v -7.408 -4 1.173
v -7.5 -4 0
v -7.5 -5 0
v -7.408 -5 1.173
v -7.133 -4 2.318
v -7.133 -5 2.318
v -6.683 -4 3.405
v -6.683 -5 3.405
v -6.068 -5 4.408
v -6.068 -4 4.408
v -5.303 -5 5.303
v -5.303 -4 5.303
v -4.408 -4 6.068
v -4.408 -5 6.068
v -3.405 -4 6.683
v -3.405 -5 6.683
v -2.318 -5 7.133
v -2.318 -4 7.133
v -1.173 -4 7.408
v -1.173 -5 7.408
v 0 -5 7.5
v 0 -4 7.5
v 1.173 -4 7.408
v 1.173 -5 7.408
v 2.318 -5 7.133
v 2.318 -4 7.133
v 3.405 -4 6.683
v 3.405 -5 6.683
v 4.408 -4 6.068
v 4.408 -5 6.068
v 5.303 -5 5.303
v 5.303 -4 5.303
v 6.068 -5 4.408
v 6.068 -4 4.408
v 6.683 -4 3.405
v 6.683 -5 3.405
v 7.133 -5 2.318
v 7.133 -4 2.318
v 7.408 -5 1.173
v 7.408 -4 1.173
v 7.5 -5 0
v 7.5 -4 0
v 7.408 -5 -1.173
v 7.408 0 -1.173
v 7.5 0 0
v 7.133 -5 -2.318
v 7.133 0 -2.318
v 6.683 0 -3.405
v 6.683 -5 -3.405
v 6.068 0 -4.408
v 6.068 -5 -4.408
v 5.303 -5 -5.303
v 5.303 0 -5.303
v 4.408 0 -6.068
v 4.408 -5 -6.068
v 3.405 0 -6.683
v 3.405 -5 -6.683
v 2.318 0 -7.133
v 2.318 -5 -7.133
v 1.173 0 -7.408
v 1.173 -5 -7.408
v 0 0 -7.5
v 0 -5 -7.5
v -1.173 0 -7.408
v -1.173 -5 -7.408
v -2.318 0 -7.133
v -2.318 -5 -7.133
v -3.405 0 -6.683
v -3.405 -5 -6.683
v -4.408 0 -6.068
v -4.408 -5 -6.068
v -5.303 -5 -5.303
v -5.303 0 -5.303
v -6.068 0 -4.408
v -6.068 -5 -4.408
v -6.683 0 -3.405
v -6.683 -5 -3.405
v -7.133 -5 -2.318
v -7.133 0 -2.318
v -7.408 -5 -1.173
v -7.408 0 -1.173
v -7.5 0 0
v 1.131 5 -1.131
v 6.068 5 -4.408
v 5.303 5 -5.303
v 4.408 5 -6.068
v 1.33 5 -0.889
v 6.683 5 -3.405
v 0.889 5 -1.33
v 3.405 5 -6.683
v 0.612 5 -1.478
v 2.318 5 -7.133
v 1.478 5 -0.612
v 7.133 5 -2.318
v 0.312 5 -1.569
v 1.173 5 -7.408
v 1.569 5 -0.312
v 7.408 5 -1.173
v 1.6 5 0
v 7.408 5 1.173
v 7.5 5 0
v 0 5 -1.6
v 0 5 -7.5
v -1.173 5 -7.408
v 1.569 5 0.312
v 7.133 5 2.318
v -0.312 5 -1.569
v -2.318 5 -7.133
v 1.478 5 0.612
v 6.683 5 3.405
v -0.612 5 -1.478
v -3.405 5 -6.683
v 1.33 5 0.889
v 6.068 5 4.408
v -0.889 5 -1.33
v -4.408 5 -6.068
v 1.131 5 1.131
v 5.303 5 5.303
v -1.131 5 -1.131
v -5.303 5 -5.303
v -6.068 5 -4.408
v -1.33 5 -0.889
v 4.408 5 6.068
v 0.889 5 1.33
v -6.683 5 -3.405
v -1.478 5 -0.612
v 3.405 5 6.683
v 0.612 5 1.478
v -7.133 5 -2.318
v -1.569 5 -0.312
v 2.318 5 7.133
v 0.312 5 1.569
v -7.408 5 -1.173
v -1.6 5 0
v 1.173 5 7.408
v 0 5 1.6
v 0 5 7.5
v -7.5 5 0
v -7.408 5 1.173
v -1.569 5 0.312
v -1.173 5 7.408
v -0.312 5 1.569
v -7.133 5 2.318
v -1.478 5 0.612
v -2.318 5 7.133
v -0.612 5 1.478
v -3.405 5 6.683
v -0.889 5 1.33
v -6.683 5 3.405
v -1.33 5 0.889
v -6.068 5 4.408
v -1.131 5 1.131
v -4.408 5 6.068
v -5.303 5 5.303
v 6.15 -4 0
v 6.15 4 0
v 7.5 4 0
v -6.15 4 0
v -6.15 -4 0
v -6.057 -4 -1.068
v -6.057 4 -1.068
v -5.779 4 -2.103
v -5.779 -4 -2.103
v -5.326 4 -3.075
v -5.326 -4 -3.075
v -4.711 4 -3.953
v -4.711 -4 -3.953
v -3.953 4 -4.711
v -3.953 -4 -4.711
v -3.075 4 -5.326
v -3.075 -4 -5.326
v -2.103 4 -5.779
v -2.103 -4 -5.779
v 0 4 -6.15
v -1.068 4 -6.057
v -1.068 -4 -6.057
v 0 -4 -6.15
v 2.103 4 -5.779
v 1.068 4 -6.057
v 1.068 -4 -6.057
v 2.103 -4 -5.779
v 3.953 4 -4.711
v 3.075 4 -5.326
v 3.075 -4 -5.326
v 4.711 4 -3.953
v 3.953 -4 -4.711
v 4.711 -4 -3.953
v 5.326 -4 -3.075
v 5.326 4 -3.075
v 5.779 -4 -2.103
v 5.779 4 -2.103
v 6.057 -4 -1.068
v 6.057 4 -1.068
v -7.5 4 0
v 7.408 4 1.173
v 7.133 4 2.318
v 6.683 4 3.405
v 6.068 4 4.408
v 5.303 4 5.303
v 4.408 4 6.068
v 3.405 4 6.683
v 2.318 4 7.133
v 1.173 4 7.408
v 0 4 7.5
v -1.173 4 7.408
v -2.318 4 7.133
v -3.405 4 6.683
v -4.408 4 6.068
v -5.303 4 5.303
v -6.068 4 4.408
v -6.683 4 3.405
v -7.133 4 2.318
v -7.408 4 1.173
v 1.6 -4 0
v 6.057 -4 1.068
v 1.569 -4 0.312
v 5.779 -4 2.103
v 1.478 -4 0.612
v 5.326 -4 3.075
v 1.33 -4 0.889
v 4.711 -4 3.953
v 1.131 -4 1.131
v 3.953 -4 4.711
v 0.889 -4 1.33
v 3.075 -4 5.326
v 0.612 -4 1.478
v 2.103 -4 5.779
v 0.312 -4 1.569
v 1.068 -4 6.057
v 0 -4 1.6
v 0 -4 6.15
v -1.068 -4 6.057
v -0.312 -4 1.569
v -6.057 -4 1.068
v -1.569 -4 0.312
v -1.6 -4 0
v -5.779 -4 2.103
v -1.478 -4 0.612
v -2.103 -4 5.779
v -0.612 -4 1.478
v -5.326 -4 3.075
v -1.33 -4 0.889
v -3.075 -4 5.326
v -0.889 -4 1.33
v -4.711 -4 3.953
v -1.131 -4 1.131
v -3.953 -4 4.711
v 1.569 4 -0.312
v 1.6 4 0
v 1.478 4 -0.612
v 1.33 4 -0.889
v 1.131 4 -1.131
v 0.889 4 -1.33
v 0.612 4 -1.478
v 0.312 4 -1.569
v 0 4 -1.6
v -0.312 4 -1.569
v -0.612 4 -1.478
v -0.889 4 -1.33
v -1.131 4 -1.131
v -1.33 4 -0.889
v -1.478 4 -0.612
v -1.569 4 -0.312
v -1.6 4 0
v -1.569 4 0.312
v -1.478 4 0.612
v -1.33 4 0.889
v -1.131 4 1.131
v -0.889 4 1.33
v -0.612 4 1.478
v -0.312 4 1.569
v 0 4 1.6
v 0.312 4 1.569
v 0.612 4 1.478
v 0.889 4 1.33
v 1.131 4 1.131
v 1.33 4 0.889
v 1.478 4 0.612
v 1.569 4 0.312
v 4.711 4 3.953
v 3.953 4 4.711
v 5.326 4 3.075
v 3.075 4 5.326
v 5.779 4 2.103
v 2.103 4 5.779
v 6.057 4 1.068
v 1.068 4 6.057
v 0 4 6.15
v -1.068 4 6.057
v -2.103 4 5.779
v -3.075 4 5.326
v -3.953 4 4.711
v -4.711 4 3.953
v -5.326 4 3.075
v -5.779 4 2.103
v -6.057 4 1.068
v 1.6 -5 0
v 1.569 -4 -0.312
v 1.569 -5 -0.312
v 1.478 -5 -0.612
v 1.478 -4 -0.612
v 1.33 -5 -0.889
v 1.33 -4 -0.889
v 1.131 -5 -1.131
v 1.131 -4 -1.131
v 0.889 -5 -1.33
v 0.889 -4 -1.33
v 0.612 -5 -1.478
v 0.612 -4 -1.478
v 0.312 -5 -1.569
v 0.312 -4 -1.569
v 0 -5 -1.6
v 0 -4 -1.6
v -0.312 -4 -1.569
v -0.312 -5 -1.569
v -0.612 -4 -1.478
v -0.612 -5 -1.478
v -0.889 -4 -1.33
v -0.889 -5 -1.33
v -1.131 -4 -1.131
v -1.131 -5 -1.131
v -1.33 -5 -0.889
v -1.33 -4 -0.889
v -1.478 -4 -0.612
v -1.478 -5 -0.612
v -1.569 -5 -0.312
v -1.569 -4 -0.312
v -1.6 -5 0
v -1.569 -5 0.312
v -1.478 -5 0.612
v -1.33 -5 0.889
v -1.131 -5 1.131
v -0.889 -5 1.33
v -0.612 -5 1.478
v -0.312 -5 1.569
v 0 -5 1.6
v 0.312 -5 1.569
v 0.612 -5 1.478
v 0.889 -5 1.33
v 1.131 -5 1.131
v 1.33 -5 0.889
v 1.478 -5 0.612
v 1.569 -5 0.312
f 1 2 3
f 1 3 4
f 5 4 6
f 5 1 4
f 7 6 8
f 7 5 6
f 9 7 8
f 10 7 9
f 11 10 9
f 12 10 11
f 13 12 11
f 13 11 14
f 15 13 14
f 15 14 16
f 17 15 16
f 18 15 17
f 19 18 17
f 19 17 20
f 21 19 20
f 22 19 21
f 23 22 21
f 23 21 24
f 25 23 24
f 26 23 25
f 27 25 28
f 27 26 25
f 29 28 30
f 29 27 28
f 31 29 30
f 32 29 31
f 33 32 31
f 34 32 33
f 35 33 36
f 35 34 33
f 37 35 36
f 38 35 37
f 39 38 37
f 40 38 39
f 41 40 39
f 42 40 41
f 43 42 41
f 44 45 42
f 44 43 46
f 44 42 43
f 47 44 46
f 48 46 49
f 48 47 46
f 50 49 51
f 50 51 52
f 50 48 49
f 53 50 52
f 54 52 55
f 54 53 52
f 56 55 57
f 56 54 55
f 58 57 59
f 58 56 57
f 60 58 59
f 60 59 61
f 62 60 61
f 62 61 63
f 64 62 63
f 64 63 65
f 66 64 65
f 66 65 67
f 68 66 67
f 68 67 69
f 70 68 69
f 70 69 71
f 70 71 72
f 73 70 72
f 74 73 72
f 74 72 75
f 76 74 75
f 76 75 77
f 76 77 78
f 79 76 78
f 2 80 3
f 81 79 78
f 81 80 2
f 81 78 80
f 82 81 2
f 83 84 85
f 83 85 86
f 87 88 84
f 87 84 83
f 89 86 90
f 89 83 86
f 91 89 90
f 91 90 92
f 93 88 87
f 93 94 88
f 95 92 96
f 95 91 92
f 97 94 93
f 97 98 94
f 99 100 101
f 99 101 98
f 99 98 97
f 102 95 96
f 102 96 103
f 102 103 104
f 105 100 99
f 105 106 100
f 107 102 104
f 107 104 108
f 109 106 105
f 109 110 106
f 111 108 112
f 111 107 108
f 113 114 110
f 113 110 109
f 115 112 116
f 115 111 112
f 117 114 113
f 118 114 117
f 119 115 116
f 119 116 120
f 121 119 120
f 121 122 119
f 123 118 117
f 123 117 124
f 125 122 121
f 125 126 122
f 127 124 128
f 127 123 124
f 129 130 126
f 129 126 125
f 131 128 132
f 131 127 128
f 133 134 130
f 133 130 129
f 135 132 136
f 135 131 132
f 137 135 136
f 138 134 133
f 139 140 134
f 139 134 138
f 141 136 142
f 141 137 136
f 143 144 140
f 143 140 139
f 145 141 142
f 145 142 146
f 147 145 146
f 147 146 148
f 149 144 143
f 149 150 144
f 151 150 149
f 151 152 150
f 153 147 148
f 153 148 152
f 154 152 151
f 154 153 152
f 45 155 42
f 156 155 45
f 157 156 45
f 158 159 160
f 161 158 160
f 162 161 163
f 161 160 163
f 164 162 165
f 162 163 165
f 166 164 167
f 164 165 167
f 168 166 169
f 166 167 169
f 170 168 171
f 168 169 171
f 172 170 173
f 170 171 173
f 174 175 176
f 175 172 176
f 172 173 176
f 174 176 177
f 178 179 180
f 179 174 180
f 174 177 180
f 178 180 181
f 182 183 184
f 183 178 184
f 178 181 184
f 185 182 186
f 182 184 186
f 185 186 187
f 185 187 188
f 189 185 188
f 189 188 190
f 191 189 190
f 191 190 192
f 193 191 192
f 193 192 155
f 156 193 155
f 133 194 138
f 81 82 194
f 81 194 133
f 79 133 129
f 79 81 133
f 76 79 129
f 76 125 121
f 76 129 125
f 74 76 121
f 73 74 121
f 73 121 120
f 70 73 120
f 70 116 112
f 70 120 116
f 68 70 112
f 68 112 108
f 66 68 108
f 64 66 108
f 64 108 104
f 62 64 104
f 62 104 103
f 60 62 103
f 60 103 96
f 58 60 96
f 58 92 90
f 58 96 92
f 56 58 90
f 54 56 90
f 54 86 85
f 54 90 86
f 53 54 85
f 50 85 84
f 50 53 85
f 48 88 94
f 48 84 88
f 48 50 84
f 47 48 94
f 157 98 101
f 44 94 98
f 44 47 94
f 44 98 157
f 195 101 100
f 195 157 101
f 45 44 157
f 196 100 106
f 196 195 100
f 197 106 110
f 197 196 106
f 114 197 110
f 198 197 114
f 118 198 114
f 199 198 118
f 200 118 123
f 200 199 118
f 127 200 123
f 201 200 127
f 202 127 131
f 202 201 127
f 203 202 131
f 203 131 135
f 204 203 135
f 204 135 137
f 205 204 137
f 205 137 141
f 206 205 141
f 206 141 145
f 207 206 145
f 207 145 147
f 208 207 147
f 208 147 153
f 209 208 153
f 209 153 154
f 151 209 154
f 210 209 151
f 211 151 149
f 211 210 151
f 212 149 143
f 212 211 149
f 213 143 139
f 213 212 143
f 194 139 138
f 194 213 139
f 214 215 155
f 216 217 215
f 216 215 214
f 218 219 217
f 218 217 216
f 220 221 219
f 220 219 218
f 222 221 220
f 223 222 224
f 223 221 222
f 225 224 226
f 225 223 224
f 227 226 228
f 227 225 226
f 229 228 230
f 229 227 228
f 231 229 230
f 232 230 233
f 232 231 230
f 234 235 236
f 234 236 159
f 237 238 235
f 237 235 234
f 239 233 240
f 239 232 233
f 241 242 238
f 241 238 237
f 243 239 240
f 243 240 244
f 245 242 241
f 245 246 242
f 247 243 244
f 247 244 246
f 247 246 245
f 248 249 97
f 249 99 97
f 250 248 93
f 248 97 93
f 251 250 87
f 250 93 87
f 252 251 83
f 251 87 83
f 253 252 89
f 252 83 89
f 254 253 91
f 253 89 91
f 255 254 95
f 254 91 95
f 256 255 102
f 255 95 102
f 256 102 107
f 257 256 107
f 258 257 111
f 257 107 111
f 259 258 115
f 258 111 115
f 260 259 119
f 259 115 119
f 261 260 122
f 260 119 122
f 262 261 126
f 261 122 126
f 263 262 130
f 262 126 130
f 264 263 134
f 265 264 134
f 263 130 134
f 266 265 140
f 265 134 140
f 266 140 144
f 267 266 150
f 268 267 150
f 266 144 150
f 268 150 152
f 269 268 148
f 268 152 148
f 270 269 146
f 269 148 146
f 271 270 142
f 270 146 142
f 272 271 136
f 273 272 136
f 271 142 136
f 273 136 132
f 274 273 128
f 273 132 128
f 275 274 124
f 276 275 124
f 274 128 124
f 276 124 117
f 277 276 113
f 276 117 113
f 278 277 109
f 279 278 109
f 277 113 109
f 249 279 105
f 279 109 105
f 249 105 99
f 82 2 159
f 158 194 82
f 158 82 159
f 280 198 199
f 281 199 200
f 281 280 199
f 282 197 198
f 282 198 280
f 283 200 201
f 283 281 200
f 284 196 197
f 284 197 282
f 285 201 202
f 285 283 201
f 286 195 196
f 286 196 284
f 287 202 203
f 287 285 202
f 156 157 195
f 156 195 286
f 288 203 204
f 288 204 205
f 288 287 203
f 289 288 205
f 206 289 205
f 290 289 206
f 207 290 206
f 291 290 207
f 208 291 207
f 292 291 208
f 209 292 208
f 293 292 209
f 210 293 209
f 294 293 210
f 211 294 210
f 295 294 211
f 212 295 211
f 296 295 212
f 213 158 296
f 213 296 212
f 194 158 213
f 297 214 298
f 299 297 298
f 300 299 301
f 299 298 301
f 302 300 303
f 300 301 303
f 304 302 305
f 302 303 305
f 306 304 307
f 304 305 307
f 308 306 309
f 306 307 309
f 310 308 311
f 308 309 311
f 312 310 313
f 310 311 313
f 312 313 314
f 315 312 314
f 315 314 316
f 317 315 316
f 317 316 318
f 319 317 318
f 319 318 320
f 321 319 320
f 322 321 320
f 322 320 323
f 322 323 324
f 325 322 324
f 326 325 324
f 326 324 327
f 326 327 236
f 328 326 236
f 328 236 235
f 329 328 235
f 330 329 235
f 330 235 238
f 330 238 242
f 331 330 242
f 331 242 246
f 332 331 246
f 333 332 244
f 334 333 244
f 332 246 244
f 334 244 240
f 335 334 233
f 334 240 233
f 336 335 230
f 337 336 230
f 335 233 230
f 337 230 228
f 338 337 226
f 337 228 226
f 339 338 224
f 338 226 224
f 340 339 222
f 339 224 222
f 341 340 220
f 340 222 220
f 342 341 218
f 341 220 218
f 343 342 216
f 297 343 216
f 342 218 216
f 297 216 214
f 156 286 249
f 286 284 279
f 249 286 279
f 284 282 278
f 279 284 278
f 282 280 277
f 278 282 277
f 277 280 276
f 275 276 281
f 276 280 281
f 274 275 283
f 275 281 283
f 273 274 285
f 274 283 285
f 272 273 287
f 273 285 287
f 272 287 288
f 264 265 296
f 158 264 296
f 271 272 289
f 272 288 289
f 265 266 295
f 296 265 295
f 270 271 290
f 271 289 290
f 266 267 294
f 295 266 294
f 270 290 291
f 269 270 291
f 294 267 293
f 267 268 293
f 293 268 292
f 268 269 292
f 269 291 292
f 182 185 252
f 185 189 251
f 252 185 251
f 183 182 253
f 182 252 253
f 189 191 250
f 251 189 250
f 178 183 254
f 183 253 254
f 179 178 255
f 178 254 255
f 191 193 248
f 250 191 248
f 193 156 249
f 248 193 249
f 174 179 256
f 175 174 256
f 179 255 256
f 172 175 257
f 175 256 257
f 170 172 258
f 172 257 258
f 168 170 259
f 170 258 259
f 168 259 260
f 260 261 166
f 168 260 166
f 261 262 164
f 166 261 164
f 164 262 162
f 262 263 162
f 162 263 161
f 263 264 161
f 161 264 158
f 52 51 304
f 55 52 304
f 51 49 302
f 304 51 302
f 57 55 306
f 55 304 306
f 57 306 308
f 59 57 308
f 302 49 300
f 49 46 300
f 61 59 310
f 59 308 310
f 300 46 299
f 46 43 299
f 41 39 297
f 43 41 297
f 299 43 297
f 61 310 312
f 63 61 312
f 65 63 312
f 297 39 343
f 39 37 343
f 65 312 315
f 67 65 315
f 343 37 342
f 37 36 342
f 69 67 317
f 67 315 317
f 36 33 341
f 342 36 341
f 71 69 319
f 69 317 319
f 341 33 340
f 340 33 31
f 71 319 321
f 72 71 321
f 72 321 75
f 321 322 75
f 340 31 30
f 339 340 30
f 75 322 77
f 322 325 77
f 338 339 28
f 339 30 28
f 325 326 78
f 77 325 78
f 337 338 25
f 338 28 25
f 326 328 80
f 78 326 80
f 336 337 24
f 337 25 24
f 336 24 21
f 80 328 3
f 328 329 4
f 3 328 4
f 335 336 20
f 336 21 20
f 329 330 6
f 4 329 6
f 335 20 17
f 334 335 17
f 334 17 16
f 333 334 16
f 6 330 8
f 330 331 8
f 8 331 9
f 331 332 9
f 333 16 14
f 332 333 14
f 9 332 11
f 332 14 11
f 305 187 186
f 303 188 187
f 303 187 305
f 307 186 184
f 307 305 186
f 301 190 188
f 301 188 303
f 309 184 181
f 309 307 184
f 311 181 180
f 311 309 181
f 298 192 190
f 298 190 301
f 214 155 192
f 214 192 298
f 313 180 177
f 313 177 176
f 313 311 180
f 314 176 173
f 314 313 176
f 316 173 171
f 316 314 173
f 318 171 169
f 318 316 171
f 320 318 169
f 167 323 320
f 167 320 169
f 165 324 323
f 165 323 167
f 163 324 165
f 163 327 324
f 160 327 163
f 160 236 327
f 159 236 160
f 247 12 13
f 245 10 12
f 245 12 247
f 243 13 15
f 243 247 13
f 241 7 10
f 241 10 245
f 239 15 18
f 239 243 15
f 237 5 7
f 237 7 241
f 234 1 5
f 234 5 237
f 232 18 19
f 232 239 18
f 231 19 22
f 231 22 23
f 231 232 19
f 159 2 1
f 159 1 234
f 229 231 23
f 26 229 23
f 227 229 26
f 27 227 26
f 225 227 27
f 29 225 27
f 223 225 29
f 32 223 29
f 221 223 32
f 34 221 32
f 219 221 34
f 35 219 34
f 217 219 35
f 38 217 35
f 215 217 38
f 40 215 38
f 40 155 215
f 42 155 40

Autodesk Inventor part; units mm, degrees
ref_plane "YZ Plane" through (0, 0, 0) normal (1, 0, 0) x (0, 1, 0)
ref_plane "XZ Plane" through (0, 0, 0) normal (0, 1, 0) x (-1, 0, 0)
ref_plane "XY Plane" through (0, 0, 0) normal (0, 0, 1) x (1, 0, 0)
sketch "Boceto1" plane through (0, 0, 0) normal (0, 1, 0) x (-1, 0, 0)
  circle A0 centre (0, 0) radius 7.5
  dimension "d0" = 15
extrude "Extrusión1" add sketch "Boceto1" along normal mid plane 10
sketch "Boceto2" plane through (0, 0, 0) normal (0, 1, 0) x (-1, 0, 0)
  circle A0 centre (0, 0) radius 6.15
  dimension "d3" = 12.3
extrude "Extrusión2" cut sketch "Boceto2" along normal mid plane 8
sketch "Boceto3" plane through (0, 5, 0) normal (0, 1, 0) x (1, 0, 0)
  circle A0 centre (0, 0) radius 1.6
  dimension "d6" = 3.2
extrude "Extrusión3" cut sketch "Boceto3" against normal through all
sketch "Boceto4" plane through (0, 0, 0) normal (0, 0, 1) x (1, 0, 0)
  line L0 (-10.1106, -4) -> (10.1106, -4)
  line L1 (10.1106, -4) -> (10.1106, 4)
  line L2 (10.1106, 4) -> (-10.1106, 4)
  line L3 (-10.1106, 4) -> (-10.1106, -4)
  line L4 (-10.1106, -4) -> (10.1106, 4) construction
  line L5 (10.1106, -4) -> (-10.1106, 4) construction
  line L6 (-7.5, -5) -> (7.5, -5) projected
  point P0 (0, 0)
  dimension "d11" = 8
  dimension "d12" = 1
extrude "Extrusión4" cut sketch "Boceto4" along normal through all
properties part number "Rubberfoot"
